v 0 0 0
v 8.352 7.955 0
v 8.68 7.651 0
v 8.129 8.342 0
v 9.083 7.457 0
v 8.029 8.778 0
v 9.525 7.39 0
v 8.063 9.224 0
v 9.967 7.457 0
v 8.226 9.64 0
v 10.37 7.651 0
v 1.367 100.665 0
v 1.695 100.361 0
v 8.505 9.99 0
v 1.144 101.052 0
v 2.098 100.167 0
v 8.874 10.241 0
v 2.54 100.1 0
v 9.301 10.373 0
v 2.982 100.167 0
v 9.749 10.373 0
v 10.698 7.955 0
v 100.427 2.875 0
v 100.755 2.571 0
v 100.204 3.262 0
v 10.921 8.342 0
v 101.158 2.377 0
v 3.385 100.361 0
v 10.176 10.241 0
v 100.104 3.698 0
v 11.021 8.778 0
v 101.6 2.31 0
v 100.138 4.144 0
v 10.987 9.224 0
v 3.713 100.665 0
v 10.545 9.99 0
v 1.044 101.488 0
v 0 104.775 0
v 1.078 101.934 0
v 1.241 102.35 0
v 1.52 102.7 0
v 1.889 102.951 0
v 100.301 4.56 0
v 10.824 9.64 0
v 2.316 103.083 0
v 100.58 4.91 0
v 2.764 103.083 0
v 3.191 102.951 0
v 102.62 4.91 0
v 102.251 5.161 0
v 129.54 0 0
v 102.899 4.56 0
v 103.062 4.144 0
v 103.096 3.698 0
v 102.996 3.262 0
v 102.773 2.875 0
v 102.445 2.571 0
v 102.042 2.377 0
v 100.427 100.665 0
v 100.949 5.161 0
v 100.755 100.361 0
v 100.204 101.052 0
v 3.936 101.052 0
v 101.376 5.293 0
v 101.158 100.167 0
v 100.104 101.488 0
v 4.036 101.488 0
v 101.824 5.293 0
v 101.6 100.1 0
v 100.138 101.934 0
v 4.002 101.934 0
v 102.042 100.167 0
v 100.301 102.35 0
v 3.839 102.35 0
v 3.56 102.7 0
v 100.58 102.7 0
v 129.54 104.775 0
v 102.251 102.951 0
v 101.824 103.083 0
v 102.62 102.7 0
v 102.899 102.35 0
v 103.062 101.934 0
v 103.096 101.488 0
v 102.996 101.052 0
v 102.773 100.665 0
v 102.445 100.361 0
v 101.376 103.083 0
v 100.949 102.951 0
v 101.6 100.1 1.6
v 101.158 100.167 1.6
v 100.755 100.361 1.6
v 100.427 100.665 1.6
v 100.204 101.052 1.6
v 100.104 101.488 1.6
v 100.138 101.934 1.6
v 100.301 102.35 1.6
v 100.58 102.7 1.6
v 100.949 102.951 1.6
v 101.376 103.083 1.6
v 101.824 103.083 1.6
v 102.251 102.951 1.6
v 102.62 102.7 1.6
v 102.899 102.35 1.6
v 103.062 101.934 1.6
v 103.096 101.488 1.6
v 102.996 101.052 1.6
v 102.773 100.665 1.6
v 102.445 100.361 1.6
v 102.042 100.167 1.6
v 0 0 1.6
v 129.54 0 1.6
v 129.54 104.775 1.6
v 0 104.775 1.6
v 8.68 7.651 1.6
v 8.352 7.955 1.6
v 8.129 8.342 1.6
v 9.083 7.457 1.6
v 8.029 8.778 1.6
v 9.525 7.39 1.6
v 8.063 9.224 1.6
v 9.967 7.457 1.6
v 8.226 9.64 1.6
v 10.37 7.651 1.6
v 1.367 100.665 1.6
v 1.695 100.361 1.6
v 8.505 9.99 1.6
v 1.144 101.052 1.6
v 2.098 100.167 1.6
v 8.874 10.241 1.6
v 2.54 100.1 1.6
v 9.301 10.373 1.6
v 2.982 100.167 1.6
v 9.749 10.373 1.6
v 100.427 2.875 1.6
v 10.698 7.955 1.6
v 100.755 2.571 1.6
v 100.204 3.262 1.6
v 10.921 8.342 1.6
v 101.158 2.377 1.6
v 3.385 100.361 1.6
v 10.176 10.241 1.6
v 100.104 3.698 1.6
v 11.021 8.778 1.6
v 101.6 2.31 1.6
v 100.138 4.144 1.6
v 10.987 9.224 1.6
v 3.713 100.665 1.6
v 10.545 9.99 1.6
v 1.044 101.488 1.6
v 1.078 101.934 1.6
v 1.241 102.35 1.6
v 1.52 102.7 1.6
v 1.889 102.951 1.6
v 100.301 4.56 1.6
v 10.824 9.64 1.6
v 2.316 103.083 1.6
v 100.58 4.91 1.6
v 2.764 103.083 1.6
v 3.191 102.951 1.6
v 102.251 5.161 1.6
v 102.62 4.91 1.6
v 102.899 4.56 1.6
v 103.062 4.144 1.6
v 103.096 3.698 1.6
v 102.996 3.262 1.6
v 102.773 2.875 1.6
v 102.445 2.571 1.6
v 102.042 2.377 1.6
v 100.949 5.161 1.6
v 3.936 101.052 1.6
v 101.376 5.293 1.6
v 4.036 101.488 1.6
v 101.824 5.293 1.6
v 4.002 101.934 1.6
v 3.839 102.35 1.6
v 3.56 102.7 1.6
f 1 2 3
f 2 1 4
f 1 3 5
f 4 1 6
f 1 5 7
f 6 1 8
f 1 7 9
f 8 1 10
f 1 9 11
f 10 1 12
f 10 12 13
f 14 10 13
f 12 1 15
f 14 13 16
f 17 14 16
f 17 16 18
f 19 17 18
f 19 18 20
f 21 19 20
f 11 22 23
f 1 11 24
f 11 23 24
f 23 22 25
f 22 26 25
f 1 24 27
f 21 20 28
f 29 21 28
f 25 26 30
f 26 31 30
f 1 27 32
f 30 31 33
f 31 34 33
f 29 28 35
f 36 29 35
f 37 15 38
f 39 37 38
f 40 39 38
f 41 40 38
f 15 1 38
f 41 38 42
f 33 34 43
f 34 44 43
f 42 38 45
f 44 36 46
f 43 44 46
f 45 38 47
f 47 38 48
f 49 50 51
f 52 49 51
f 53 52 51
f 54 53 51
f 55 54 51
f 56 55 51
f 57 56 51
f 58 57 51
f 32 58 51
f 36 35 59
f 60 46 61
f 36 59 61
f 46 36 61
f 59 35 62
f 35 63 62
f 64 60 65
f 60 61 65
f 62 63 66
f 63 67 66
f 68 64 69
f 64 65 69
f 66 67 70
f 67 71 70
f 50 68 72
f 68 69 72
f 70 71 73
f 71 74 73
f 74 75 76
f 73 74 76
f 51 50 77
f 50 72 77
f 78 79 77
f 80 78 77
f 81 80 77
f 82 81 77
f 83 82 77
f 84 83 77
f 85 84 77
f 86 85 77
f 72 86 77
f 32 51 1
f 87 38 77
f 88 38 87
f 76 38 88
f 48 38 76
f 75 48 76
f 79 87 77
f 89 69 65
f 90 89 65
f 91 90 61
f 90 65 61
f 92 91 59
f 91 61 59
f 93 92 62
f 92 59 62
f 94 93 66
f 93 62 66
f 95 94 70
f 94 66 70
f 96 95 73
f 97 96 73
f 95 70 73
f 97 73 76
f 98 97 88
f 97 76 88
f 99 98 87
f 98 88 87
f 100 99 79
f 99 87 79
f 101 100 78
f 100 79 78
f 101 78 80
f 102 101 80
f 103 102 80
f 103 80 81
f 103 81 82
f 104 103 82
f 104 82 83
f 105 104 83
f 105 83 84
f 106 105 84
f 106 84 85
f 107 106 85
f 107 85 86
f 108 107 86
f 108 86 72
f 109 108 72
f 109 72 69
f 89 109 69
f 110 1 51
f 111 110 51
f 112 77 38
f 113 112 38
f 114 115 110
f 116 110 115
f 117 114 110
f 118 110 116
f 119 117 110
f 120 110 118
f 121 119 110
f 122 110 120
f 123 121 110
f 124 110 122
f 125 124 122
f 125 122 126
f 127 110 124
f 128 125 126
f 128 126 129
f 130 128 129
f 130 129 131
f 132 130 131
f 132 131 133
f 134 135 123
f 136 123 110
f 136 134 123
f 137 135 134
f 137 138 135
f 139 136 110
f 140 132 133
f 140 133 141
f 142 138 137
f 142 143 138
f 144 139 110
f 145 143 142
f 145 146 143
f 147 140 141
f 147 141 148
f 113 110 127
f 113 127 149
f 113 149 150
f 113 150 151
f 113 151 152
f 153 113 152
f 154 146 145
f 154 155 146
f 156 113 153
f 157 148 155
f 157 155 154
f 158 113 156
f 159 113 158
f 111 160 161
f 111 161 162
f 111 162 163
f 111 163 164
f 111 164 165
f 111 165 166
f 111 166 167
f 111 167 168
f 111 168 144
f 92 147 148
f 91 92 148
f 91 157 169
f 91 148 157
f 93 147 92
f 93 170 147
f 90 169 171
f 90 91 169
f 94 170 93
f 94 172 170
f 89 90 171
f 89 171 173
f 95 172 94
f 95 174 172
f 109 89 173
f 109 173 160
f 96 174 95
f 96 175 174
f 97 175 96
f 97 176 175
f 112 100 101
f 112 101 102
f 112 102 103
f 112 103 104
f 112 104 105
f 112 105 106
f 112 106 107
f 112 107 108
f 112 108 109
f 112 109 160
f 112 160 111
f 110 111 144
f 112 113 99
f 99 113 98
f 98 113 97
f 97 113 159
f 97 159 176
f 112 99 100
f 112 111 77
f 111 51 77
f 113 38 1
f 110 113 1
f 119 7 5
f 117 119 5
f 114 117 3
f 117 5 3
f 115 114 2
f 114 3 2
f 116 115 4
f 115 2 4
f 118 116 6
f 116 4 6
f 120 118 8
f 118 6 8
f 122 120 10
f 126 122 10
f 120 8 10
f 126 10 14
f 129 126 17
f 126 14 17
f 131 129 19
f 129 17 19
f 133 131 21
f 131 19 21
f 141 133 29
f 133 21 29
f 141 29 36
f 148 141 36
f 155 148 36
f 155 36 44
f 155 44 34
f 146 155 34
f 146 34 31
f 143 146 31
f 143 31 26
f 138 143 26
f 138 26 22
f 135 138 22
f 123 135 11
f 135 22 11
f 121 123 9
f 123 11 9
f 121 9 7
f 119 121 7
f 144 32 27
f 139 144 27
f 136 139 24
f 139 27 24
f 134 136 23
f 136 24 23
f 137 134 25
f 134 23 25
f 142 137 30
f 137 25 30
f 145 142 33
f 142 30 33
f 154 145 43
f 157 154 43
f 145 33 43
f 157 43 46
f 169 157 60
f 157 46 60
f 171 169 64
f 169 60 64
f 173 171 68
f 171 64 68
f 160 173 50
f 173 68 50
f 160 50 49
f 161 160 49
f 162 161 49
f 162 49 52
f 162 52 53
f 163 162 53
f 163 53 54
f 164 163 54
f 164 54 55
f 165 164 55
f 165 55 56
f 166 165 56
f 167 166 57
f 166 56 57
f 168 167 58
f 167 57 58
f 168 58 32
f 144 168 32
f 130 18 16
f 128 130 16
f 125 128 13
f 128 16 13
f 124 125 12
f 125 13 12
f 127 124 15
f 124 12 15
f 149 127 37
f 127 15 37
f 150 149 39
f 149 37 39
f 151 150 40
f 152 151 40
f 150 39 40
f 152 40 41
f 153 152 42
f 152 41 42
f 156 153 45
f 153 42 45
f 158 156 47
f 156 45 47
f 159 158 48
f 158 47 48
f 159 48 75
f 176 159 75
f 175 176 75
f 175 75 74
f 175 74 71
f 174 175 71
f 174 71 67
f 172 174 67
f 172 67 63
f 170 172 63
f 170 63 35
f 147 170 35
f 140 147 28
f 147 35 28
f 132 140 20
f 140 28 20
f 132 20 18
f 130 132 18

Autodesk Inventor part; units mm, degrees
ref_plane "YZ Plane" through (0, 0, 0) normal (1, 0, 0) x (0, 1, 0)
ref_plane "XZ Plane" through (0, 0, 0) normal (0, 1, 0) x (-1, 0, 0)
ref_plane "XY Plane" through (0, 0, 0) normal (0, 0, 1) x (1, 0, 0)
sketch "Sketch1" plane through (0, 0, 0) normal (0, 0, 1) x (1, 0, 0)
  line L0 (0, 0) -> (129.54, 0)
  line L1 (129.54, 0) -> (129.54, 104.775)
  line L2 (129.54, 104.775) -> (0, 104.775)
  line L3 (0, 104.775) -> (0, 0)
  dimension "d0" = 129.54
  dimension "d1" = 104.775
extrude "Extrusion1" add sketch "Sketch1" along normal blind 1.6
sketch "Sketch2" plane through (0, 0, 1.6) normal (0, 0, 1) x (1, 0, 0)
  line L0 (0, 0) -> (129.54, 0) projected
  line L1 (0, 104.775) -> (0, 0) projected
  point P0 (9.525, 8.89)
  point P1 (101.6, 3.81)
  point P2 (2.54, 101.6)
  point P3 (101.6, 101.6)
  dimension "d5" = 8.89
  dimension "d6" = 9.525
  dimension "d7" = 3.81
  dimension "d8" = 101.6
  dimension "d9" = 2.54
  dimension "d10" = 101.6
hole "Hole1" at (9.525, 8.89, 1.6) at (101.6, 3.81, 1.6) at (2.54, 101.6, 1.6) at (101.6, 101.6, 1.6) direction (0, 0, -1) diameter 3 end through all
properties part number "Smoothieboard"
